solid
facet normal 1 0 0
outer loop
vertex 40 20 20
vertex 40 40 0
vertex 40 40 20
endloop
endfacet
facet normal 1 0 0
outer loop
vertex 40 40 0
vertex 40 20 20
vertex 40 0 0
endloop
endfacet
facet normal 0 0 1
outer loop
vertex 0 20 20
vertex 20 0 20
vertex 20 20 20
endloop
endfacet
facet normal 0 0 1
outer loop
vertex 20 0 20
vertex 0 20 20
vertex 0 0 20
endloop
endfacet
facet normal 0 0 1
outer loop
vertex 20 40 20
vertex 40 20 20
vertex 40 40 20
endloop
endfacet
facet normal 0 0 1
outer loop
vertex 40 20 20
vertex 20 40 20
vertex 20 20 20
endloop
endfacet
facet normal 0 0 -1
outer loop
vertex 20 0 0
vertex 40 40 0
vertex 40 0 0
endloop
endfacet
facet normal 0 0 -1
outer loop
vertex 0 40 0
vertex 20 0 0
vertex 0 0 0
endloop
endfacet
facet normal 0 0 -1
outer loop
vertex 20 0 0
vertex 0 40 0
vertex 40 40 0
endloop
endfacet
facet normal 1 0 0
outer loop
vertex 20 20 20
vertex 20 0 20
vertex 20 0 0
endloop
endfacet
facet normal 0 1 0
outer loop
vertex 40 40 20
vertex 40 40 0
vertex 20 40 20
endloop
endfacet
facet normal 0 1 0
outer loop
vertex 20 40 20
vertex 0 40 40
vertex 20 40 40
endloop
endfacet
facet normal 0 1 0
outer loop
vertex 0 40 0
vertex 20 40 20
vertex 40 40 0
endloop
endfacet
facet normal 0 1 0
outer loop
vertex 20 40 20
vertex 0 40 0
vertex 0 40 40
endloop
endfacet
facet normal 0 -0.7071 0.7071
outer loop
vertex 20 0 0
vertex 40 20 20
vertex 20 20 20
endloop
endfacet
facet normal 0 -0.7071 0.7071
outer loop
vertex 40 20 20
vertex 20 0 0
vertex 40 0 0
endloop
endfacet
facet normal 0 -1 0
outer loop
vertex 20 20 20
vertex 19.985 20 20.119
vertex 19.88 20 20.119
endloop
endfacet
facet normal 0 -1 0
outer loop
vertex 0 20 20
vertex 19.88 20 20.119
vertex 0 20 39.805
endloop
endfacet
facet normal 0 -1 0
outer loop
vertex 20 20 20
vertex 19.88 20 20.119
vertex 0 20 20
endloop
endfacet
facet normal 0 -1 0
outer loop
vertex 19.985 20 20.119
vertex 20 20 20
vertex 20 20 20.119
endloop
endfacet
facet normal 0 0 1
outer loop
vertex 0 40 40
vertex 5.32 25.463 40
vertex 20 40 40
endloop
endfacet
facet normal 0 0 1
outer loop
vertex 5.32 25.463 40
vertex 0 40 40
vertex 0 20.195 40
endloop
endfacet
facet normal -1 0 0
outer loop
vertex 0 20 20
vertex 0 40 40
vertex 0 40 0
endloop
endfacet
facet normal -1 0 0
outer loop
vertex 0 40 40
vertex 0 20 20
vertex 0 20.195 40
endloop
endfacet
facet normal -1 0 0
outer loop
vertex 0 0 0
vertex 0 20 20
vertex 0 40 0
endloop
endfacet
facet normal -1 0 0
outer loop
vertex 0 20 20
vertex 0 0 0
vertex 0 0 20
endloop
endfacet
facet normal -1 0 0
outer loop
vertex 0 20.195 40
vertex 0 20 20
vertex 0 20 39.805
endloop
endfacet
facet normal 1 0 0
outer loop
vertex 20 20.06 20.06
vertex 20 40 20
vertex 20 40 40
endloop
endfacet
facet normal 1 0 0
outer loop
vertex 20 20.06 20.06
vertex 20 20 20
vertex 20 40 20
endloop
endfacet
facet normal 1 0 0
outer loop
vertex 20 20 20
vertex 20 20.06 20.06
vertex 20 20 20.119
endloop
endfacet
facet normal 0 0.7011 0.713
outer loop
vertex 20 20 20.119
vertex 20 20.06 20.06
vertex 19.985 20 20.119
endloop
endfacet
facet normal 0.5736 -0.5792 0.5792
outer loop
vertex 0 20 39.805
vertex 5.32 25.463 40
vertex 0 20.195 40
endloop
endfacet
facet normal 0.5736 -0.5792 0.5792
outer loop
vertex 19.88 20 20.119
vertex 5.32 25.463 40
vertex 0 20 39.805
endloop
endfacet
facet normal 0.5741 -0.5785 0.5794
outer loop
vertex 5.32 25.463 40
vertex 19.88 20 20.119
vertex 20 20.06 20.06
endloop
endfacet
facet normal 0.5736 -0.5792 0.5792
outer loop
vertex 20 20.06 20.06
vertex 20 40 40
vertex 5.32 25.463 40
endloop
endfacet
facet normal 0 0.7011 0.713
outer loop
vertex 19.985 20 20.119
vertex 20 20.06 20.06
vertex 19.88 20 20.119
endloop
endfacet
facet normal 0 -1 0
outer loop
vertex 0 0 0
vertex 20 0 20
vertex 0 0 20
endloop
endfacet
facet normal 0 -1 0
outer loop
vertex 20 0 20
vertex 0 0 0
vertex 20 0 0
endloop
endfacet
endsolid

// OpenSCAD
cube([20,40,20]);
difference(){
translate([20, 0, 0])
cube([20,40,20]);
 translate([20, 0, 0])
    rotate([45, 0, 0])
cube([20,40,20]);   
}

// cubo con plano doble inclinado
translate([20, 40, 40])
  rotate([180, 0, 270])
    difference() {
      cube([20, 20, 20], center=false);

      mirror([0,0,1]){
        rotate([35, 45, 0]){
          color([1,0.8,0]) {
            cube([28.2, 28.2, 28.2], center=false);
          }
        }
      }
    }
  
